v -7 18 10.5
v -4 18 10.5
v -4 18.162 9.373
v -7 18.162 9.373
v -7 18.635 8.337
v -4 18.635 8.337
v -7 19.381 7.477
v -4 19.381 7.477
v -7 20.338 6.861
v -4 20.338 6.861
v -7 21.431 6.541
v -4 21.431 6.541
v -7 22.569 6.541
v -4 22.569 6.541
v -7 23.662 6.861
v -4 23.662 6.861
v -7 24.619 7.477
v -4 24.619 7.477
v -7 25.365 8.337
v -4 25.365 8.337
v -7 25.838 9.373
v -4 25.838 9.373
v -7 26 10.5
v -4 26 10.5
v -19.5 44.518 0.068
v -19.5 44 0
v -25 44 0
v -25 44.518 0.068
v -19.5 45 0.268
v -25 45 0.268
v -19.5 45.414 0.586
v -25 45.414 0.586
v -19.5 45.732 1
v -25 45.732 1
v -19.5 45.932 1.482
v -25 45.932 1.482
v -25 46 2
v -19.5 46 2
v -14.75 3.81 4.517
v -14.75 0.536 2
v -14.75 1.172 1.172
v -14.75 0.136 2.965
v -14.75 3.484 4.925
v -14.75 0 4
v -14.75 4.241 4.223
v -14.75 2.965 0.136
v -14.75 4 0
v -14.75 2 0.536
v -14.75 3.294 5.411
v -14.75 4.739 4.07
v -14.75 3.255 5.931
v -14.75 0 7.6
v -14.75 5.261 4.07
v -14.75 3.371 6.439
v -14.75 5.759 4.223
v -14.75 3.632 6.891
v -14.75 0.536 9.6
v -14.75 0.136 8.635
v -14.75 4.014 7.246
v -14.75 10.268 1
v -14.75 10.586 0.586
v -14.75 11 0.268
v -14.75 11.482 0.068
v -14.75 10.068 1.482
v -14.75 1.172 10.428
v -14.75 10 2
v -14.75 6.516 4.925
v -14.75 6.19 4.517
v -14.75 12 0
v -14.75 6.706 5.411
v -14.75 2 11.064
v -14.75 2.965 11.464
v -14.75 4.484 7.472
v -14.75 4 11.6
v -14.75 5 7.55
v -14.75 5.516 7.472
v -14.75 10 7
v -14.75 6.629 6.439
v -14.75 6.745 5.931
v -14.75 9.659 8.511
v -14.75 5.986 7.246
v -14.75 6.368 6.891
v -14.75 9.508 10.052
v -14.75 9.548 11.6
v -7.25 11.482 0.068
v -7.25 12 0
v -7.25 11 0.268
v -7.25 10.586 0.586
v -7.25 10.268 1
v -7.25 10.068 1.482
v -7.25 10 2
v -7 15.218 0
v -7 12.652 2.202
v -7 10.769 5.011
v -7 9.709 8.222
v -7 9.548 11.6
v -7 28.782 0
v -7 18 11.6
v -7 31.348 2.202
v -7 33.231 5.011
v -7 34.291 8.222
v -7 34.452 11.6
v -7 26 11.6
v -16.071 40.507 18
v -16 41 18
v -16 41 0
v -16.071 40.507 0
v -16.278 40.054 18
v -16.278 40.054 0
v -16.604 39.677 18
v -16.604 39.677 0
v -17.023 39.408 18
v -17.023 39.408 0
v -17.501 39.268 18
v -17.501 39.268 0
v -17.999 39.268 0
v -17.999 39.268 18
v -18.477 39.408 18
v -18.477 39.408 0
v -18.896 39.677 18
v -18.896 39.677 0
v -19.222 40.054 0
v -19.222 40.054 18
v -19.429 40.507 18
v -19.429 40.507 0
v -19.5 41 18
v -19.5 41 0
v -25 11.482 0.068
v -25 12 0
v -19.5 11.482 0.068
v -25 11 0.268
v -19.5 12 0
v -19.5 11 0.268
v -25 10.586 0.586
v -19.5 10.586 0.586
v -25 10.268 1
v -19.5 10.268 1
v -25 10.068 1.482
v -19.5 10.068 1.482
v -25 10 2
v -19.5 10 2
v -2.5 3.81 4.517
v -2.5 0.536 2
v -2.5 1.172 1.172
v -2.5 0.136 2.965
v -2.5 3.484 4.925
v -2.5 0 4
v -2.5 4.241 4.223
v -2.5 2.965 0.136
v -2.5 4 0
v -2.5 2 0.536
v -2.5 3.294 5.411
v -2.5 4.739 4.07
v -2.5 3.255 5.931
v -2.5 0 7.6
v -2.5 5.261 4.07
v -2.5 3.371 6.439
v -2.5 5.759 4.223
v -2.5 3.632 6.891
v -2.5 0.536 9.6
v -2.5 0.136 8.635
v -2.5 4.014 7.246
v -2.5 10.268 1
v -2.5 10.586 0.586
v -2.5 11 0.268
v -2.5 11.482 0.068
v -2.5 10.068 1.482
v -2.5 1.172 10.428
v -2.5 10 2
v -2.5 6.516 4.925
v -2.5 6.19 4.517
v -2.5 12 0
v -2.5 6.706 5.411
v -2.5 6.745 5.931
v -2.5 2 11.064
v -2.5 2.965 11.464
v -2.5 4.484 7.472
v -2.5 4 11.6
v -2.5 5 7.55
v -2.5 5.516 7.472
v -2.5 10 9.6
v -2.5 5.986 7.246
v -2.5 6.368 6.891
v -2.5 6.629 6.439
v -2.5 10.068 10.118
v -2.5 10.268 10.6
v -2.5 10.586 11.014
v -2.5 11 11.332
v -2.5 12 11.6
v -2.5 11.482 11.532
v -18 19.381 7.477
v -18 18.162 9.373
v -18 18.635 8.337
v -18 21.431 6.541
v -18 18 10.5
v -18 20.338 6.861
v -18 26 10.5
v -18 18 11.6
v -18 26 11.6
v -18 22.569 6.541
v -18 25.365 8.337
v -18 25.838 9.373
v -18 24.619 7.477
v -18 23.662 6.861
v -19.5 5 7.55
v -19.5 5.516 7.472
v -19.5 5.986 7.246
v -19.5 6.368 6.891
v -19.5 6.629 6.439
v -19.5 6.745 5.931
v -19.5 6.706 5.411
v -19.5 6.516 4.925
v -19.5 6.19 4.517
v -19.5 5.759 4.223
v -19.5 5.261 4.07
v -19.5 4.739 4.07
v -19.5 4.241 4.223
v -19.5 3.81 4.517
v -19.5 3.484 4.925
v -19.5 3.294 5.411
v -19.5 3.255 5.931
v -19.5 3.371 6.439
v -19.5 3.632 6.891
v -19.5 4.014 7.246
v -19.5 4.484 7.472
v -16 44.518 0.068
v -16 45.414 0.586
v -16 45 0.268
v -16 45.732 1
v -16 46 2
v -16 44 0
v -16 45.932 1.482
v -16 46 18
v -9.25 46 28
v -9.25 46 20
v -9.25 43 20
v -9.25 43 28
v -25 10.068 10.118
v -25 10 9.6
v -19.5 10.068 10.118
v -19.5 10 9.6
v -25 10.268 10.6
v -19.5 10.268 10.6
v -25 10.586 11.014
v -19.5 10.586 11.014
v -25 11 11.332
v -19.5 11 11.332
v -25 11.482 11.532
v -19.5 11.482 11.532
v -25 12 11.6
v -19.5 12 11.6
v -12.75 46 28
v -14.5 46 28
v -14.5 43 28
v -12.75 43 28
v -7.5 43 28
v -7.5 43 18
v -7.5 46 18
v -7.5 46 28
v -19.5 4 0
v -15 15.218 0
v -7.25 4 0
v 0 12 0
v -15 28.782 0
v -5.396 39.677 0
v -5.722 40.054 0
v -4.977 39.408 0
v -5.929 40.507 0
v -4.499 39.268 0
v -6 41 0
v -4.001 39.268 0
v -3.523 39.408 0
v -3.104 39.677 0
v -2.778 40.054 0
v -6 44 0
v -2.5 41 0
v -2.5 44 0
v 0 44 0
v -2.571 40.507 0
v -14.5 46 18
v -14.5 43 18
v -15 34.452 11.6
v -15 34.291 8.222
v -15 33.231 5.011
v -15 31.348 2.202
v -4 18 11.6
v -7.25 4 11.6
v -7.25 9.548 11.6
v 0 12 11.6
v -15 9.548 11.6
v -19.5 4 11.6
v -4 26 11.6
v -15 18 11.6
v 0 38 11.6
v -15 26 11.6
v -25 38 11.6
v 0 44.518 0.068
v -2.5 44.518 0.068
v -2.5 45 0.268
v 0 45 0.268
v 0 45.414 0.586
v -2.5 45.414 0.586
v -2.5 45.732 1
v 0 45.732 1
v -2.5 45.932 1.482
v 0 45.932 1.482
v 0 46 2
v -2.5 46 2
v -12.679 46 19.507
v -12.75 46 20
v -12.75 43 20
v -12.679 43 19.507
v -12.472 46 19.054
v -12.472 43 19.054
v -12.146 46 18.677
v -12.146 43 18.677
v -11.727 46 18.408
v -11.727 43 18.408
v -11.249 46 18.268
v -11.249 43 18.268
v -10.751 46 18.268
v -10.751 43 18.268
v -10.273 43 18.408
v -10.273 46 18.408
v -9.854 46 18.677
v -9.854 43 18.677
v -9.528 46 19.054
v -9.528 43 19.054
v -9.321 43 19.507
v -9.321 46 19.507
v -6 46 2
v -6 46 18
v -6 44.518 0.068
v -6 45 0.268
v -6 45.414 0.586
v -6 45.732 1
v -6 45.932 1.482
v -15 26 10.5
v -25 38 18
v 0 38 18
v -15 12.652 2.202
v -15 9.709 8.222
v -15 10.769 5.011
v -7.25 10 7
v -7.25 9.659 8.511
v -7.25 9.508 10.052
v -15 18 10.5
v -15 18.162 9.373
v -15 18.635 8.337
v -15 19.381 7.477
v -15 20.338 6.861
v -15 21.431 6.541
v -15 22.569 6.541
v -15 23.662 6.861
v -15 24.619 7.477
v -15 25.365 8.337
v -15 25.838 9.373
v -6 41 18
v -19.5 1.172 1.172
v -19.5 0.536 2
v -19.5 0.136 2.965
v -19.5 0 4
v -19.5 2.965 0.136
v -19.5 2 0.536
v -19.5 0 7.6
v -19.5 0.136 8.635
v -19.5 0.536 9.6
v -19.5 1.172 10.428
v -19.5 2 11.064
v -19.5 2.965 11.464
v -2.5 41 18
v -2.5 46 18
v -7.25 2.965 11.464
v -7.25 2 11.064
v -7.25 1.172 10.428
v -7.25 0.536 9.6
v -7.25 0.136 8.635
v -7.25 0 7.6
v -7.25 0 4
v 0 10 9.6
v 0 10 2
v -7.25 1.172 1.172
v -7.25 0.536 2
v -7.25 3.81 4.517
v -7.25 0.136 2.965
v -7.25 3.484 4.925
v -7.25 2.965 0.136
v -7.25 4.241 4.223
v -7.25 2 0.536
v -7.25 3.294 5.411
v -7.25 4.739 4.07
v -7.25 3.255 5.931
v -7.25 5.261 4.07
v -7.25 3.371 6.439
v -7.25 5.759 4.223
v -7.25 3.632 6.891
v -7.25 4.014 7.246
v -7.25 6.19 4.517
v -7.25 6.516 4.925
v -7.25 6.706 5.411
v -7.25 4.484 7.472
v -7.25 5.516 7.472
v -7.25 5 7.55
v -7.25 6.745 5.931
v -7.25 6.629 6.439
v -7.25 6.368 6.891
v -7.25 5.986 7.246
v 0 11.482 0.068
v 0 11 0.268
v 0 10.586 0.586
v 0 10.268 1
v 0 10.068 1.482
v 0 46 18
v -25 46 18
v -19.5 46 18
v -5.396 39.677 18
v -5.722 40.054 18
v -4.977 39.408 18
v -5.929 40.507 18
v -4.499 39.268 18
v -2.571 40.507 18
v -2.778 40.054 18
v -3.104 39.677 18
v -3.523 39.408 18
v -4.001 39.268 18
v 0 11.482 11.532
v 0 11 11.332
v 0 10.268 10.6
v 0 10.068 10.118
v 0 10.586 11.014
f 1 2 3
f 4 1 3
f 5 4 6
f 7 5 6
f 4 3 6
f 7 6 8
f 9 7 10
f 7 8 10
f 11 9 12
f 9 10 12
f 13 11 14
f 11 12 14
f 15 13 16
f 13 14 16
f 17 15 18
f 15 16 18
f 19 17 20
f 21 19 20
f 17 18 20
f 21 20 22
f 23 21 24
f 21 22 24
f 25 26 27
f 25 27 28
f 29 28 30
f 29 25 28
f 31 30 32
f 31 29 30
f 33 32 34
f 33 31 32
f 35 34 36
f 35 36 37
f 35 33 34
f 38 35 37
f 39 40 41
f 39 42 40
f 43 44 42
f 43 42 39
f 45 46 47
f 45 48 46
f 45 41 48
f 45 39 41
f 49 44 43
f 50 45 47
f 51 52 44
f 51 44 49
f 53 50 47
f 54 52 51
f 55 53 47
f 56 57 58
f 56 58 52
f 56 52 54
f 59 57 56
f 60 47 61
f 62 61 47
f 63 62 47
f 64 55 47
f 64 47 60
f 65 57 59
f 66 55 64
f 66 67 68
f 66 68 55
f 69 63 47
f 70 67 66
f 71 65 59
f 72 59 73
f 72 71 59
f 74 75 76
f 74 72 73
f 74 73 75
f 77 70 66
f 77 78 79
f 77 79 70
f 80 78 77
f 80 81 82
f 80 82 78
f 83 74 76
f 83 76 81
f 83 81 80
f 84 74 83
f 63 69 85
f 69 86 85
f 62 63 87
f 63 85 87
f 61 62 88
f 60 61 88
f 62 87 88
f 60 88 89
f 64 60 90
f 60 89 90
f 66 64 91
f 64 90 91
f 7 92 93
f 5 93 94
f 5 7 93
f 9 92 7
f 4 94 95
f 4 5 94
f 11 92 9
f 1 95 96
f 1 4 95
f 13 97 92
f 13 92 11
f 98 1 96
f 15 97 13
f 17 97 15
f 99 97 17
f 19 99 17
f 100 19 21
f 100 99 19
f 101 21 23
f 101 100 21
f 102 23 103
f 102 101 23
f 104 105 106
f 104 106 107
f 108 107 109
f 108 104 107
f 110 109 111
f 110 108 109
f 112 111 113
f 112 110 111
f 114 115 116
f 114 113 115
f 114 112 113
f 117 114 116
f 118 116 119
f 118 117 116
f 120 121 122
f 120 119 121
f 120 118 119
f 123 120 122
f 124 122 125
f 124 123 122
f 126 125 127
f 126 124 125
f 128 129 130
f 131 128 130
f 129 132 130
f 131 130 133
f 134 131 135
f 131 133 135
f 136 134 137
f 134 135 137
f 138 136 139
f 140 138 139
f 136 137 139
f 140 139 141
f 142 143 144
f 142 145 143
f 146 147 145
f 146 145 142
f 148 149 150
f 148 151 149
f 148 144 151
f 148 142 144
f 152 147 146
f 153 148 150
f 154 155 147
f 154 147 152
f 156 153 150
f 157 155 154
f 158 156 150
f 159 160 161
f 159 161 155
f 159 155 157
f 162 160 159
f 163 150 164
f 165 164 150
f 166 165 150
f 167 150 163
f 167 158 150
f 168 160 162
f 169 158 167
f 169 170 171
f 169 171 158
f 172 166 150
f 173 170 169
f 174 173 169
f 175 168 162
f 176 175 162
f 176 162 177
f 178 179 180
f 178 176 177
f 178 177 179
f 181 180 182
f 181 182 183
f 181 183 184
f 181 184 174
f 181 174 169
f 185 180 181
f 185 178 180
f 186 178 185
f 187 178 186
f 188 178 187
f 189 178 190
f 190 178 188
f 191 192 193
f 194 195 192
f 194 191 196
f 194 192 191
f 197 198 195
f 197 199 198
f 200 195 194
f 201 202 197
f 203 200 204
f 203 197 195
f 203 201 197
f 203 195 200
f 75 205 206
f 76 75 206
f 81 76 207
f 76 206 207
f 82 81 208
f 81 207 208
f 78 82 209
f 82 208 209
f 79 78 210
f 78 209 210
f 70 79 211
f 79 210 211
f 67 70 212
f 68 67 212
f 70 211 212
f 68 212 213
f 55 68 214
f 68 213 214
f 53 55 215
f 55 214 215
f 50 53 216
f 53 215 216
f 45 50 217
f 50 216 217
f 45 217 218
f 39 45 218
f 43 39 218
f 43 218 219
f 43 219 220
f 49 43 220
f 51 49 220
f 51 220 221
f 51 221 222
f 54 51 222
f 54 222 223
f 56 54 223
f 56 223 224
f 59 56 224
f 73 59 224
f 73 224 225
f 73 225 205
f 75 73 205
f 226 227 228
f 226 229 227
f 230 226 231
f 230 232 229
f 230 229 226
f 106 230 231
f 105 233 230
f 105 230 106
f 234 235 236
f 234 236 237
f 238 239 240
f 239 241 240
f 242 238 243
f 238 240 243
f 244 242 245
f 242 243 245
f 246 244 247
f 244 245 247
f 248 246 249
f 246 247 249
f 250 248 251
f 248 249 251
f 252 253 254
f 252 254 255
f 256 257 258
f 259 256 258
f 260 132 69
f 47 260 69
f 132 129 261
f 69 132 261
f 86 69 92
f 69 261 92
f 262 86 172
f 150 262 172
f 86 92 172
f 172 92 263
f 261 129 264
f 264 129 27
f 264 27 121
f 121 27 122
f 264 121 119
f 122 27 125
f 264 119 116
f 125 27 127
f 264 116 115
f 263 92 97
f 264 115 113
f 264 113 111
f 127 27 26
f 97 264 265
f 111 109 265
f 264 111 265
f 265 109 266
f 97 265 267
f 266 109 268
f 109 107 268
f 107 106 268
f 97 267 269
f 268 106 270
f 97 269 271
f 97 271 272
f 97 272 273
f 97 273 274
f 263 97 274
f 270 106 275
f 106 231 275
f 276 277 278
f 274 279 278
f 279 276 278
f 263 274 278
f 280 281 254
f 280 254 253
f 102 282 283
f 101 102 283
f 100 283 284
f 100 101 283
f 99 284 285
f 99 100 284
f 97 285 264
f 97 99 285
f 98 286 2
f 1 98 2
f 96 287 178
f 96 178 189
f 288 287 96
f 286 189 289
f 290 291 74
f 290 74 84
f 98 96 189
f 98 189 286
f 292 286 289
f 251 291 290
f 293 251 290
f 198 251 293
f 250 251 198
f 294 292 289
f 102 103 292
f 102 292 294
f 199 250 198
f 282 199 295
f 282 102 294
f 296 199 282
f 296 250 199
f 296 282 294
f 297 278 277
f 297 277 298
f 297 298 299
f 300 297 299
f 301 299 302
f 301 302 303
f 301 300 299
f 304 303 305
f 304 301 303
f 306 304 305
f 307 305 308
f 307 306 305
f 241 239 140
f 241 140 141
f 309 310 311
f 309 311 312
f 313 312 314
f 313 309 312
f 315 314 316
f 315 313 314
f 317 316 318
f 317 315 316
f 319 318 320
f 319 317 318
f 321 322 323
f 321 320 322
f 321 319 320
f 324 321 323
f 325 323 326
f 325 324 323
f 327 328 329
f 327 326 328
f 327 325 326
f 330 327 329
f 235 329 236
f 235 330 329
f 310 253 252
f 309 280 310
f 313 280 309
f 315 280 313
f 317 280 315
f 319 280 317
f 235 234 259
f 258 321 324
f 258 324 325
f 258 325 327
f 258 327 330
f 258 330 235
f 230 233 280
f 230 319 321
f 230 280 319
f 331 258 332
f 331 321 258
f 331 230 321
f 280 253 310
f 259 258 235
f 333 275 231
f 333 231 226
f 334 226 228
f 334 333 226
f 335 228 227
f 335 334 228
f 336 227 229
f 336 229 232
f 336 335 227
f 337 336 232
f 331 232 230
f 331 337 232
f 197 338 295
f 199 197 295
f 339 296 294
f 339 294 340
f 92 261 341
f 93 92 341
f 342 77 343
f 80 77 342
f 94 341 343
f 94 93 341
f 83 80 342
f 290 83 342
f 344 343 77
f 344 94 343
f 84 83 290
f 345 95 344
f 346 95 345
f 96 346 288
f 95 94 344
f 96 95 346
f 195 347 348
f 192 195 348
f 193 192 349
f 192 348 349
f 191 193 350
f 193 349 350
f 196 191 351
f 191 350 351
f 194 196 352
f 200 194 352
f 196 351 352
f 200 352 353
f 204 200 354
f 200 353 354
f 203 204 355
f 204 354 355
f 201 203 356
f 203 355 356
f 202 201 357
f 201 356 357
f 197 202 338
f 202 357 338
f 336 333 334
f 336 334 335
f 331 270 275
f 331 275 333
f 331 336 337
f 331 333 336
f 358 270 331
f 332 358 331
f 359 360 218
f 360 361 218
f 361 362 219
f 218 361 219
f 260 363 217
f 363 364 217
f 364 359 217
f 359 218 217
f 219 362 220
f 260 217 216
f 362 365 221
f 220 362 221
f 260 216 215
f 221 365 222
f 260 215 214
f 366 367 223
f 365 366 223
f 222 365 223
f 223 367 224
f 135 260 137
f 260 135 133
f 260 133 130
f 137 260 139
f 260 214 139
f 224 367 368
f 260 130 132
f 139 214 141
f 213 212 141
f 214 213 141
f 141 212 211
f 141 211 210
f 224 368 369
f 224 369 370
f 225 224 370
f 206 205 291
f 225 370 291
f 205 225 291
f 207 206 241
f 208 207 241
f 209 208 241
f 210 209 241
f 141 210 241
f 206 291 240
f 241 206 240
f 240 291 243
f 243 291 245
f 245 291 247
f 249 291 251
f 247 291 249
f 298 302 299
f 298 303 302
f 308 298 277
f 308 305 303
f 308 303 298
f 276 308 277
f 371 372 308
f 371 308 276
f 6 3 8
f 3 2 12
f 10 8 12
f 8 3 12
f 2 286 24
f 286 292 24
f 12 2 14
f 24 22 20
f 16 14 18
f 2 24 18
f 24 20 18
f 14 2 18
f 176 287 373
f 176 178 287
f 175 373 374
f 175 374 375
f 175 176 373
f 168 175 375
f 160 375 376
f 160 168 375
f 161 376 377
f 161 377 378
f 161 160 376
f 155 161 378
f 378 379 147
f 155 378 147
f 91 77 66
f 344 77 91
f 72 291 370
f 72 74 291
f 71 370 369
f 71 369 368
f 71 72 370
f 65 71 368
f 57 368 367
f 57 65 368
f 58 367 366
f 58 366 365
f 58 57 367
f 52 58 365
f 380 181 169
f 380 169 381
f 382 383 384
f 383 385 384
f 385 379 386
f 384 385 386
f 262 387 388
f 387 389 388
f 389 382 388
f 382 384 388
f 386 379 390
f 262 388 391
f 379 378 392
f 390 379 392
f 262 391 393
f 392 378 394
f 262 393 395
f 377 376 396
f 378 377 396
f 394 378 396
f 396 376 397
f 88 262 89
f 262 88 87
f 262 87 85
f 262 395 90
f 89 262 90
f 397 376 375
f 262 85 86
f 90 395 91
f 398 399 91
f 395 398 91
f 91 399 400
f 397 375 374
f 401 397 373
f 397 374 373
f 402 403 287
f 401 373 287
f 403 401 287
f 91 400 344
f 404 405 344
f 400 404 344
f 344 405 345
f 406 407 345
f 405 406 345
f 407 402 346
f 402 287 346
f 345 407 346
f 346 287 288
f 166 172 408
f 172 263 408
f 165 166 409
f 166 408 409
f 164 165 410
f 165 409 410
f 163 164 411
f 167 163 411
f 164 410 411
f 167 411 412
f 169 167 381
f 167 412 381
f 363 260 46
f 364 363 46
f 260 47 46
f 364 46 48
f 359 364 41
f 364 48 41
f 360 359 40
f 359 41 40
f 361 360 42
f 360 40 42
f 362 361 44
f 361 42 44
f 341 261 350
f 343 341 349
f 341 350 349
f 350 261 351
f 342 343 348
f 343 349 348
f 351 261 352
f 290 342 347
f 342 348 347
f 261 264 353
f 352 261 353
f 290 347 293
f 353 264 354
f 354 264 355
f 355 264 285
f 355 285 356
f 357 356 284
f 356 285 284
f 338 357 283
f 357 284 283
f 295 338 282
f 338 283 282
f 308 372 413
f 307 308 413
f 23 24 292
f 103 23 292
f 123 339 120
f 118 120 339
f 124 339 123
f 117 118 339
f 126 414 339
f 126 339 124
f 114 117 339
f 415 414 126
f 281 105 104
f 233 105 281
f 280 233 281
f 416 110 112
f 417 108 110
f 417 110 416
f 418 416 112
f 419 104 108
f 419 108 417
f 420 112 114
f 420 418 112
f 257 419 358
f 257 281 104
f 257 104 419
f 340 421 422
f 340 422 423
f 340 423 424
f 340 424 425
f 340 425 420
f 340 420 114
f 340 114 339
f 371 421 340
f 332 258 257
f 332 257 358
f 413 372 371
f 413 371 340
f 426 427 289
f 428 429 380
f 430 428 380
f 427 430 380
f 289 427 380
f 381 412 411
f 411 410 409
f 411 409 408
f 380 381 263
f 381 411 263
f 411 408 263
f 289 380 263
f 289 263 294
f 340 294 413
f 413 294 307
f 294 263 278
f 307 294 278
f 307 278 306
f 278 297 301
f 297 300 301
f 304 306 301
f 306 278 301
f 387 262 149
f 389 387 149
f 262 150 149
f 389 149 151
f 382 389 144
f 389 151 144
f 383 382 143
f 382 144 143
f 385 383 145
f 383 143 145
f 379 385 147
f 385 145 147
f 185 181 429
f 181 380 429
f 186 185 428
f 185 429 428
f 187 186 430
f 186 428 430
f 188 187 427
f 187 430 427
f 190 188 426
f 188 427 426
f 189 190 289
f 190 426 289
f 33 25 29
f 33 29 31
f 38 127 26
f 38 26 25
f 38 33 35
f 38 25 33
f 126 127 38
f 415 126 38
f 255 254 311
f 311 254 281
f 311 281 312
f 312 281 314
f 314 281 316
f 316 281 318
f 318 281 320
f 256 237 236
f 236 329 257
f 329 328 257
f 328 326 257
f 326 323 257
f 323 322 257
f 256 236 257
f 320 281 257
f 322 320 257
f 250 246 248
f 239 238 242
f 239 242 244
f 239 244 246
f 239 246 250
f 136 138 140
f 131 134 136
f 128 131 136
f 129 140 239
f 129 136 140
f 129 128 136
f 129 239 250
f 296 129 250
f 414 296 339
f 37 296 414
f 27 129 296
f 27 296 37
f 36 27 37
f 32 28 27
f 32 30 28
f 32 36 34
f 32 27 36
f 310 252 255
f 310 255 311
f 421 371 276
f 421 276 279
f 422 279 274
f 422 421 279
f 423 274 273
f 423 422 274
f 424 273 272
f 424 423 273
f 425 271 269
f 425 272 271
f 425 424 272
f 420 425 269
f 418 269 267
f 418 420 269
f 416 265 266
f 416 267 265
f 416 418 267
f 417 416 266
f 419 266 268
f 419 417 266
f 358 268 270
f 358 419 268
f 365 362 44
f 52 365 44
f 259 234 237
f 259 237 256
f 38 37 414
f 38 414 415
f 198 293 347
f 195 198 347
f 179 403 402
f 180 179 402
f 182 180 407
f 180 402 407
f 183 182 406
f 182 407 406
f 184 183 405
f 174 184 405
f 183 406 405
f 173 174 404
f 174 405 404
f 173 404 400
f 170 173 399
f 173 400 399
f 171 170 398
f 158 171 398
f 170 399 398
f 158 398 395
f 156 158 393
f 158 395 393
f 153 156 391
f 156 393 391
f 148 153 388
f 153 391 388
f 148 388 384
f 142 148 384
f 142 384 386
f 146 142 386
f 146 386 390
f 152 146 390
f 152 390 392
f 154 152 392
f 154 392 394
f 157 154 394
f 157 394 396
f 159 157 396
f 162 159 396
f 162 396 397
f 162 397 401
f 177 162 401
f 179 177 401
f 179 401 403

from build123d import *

# Parameters (mm, degrees)
SKETCH1_W               = 25
SKETCH1_H               = 46
BOSS_EXTRUDE1_DEPTH     = 18
SKETCH2_W               = 7
SKETCH2_H               = 3
BOSS_EXTRUDE2_DEPTH     = 10
CUT_EXTRUDE1_DEPTH      = 10
CUT_EXTRUDE2_DEPTH      = 4
CUT_EXTRUDE2_DEPTH_BACK = 4
SKETCH5_R               = 12.5
CUT_EXTRUDE3_DEPTH      = 7
CUT_EXTRUDE3_DEPTH_BACK = 7
CUT_EXTRUDE4_REACH      = 61.372
SKETCH8_R               = 1.75
SKETCH9_W               = 6.4
SKETCH9_H               = 38
CUT_EXTRUDE5_DEPTH      = 36
SKETCH10_W              = 7.5
SKETCH10_H              = 10
SKETCH10_W_2            = 2.5
SKETCH10_W_3            = 5.5
CUT_EXTRUDE6_DEPTH      = 32
FILLET1_R               = 4
FILLET2_R               = 2
CUT_EXTRUDE7_DEPTH      = 32


with BuildPart() as part:
    # Sketch1 → Boss-Extrude1 (new body)
    with BuildSketch(Plane.XY):
        with Locations((-12.5, 23)):
            Rectangle(SKETCH1_W, SKETCH1_H)
    extrude(amount=BOSS_EXTRUDE1_DEPTH)

    # Sketch2 → Boss-Extrude2 (add)
    with BuildSketch(Plane.XY.offset(18)):
        with Locations((-11, 44.5)):
            Rectangle(SKETCH2_W, SKETCH2_H)
    extrude(amount=BOSS_EXTRUDE2_DEPTH)

    # Sketch3 → Cut-Extrude1 (cut)
    with BuildSketch(Plane(origin=(0, 46, 0), x_dir=(1, 0, 0), z_dir=(0, 1, 0))):
        with BuildLine():
            Line((-12.75, -28), (-12.75, -20))
            ThreePointArc((-12.75, -20), (-11, -18.25), (-9.25, -20))
            Line((-9.25, -20), (-9.25, -28))
            ThreePointArc((-9.25, -28), (-11, -29.75), (-12.75, -28))
        make_face()
    extrude(amount=-CUT_EXTRUDE1_DEPTH, mode=Mode.SUBTRACT)

    # Sketch5 → Cut-Extrude2 (cut, two sides: drawn at the far end of the back side and taken through both)
    with BuildSketch(Plane.ZY.offset(11).offset(-CUT_EXTRUDE2_DEPTH_BACK)):
        with Locations((10.5, 22)):
            Circle(SKETCH5_R)
    extrude(amount=CUT_EXTRUDE2_DEPTH + CUT_EXTRUDE2_DEPTH_BACK, mode=Mode.SUBTRACT)

    # Sketch7 → Cut-Extrude3 (cut, two sides: drawn at the far end of the back side and taken through both)
    with BuildSketch(Plane.ZY.offset(11).offset(-CUT_EXTRUDE3_DEPTH_BACK)):
        with BuildLine():
            Line((10.5, 26), (19.804509891, 26))
            ThreePointArc((19.804509891, 26), (23.804509891, 22), (19.804509891, 18))
            Line((19.804509891, 18), (10.5, 18))
            ThreePointArc((10.5, 18), (6.5, 22), (10.5, 26))
        make_face()
    extrude(amount=CUT_EXTRUDE3_DEPTH + CUT_EXTRUDE3_DEPTH_BACK, mode=Mode.SUBTRACT)

    # Sketch8 → Cut-Extrude4 (cut, up to next)
    with BuildSketch(Plane.ZY.offset(25), mode=Mode.PRIVATE) as cut_extrude4_sk1:
        with Locations((5.8, 5)):
            Circle(SKETCH8_R)
    cut_extrude4_tool1 = extrude(cut_extrude4_sk1.sketch, amount=-CUT_EXTRUDE4_REACH, mode=Mode.PRIVATE) & part.part
    add(cut_extrude4_tool1.solids().sort_by_distance((-25, 5, 5.8))[0], mode=Mode.SUBTRACT)

    # Sketch9 → Cut-Extrude5 (cut)
    with BuildSketch(Plane.ZY.offset(25)):
        with Locations((14.8, 19)):
            Rectangle(SKETCH9_W, SKETCH9_H)
    extrude(amount=-CUT_EXTRUDE5_DEPTH, mode=Mode.SUBTRACT)

    # Sketch10 → Cut-Extrude6 (cut)
    with BuildSketch(Plane.XY.offset(11.6)):
        with Locations((-11, 5)):
            Rectangle(SKETCH10_W, SKETCH10_H)
        with Locations((-1.25, 5)):
            Rectangle(SKETCH10_W_2, SKETCH10_H)
        with Locations((-22.25, 5)):
            Rectangle(SKETCH10_W_3, SKETCH10_H)
    extrude(amount=-CUT_EXTRUDE6_DEPTH, mode=Mode.SUBTRACT)

    # Fillet1
    fillet1_edges = [part.edges().sort_by_distance(p)[0] for p in [
        (-17.125, 0, 11.6),
        (-4.875, 0, 0),
        (-4.875, 0, 11.6),
        (-17.125, 0, 0),
    ]]
    fillet(fillet1_edges, radius=FILLET1_R)

    # Fillet2
    fillet2_edges = [part.edges().sort_by_distance(p)[0] for p in [
        (-11, 10, 0),
        (-1.25, 10, 0),
        (-1.25, 10, 11.6),
        (-22.25, 10, 0),
        (-22.25, 10, 11.6),
        (-12.5, 46, 0),
    ]]
    fillet(fillet2_edges, radius=FILLET2_R)

    # Sketch11 → Cut-Extrude7 (cut)
    with BuildSketch(Plane.XY.offset(18)):
        with BuildLine():
            Line((-19.5, 41), (-19.5, 46.514894744))
            Line((-19.5, 46.514894744), (-16, 46.514894744))
            Line((-16, 46.514894744), (-16, 41))
            ThreePointArc((-16, 41), (-17.75, 39.25), (-19.5, 41))
        make_face()
        with BuildLine():
            Line((-6, 41), (-6, 46.514894744))
            Line((-6, 46.514894744), (-2.5, 46.514894744))
            Line((-2.5, 46.514894744), (-2.5, 41))
            ThreePointArc((-2.5, 41), (-4.25, 39.25), (-6, 41))
        make_face()
    extrude(amount=-CUT_EXTRUDE7_DEPTH, mode=Mode.SUBTRACT)


solid = part.part
